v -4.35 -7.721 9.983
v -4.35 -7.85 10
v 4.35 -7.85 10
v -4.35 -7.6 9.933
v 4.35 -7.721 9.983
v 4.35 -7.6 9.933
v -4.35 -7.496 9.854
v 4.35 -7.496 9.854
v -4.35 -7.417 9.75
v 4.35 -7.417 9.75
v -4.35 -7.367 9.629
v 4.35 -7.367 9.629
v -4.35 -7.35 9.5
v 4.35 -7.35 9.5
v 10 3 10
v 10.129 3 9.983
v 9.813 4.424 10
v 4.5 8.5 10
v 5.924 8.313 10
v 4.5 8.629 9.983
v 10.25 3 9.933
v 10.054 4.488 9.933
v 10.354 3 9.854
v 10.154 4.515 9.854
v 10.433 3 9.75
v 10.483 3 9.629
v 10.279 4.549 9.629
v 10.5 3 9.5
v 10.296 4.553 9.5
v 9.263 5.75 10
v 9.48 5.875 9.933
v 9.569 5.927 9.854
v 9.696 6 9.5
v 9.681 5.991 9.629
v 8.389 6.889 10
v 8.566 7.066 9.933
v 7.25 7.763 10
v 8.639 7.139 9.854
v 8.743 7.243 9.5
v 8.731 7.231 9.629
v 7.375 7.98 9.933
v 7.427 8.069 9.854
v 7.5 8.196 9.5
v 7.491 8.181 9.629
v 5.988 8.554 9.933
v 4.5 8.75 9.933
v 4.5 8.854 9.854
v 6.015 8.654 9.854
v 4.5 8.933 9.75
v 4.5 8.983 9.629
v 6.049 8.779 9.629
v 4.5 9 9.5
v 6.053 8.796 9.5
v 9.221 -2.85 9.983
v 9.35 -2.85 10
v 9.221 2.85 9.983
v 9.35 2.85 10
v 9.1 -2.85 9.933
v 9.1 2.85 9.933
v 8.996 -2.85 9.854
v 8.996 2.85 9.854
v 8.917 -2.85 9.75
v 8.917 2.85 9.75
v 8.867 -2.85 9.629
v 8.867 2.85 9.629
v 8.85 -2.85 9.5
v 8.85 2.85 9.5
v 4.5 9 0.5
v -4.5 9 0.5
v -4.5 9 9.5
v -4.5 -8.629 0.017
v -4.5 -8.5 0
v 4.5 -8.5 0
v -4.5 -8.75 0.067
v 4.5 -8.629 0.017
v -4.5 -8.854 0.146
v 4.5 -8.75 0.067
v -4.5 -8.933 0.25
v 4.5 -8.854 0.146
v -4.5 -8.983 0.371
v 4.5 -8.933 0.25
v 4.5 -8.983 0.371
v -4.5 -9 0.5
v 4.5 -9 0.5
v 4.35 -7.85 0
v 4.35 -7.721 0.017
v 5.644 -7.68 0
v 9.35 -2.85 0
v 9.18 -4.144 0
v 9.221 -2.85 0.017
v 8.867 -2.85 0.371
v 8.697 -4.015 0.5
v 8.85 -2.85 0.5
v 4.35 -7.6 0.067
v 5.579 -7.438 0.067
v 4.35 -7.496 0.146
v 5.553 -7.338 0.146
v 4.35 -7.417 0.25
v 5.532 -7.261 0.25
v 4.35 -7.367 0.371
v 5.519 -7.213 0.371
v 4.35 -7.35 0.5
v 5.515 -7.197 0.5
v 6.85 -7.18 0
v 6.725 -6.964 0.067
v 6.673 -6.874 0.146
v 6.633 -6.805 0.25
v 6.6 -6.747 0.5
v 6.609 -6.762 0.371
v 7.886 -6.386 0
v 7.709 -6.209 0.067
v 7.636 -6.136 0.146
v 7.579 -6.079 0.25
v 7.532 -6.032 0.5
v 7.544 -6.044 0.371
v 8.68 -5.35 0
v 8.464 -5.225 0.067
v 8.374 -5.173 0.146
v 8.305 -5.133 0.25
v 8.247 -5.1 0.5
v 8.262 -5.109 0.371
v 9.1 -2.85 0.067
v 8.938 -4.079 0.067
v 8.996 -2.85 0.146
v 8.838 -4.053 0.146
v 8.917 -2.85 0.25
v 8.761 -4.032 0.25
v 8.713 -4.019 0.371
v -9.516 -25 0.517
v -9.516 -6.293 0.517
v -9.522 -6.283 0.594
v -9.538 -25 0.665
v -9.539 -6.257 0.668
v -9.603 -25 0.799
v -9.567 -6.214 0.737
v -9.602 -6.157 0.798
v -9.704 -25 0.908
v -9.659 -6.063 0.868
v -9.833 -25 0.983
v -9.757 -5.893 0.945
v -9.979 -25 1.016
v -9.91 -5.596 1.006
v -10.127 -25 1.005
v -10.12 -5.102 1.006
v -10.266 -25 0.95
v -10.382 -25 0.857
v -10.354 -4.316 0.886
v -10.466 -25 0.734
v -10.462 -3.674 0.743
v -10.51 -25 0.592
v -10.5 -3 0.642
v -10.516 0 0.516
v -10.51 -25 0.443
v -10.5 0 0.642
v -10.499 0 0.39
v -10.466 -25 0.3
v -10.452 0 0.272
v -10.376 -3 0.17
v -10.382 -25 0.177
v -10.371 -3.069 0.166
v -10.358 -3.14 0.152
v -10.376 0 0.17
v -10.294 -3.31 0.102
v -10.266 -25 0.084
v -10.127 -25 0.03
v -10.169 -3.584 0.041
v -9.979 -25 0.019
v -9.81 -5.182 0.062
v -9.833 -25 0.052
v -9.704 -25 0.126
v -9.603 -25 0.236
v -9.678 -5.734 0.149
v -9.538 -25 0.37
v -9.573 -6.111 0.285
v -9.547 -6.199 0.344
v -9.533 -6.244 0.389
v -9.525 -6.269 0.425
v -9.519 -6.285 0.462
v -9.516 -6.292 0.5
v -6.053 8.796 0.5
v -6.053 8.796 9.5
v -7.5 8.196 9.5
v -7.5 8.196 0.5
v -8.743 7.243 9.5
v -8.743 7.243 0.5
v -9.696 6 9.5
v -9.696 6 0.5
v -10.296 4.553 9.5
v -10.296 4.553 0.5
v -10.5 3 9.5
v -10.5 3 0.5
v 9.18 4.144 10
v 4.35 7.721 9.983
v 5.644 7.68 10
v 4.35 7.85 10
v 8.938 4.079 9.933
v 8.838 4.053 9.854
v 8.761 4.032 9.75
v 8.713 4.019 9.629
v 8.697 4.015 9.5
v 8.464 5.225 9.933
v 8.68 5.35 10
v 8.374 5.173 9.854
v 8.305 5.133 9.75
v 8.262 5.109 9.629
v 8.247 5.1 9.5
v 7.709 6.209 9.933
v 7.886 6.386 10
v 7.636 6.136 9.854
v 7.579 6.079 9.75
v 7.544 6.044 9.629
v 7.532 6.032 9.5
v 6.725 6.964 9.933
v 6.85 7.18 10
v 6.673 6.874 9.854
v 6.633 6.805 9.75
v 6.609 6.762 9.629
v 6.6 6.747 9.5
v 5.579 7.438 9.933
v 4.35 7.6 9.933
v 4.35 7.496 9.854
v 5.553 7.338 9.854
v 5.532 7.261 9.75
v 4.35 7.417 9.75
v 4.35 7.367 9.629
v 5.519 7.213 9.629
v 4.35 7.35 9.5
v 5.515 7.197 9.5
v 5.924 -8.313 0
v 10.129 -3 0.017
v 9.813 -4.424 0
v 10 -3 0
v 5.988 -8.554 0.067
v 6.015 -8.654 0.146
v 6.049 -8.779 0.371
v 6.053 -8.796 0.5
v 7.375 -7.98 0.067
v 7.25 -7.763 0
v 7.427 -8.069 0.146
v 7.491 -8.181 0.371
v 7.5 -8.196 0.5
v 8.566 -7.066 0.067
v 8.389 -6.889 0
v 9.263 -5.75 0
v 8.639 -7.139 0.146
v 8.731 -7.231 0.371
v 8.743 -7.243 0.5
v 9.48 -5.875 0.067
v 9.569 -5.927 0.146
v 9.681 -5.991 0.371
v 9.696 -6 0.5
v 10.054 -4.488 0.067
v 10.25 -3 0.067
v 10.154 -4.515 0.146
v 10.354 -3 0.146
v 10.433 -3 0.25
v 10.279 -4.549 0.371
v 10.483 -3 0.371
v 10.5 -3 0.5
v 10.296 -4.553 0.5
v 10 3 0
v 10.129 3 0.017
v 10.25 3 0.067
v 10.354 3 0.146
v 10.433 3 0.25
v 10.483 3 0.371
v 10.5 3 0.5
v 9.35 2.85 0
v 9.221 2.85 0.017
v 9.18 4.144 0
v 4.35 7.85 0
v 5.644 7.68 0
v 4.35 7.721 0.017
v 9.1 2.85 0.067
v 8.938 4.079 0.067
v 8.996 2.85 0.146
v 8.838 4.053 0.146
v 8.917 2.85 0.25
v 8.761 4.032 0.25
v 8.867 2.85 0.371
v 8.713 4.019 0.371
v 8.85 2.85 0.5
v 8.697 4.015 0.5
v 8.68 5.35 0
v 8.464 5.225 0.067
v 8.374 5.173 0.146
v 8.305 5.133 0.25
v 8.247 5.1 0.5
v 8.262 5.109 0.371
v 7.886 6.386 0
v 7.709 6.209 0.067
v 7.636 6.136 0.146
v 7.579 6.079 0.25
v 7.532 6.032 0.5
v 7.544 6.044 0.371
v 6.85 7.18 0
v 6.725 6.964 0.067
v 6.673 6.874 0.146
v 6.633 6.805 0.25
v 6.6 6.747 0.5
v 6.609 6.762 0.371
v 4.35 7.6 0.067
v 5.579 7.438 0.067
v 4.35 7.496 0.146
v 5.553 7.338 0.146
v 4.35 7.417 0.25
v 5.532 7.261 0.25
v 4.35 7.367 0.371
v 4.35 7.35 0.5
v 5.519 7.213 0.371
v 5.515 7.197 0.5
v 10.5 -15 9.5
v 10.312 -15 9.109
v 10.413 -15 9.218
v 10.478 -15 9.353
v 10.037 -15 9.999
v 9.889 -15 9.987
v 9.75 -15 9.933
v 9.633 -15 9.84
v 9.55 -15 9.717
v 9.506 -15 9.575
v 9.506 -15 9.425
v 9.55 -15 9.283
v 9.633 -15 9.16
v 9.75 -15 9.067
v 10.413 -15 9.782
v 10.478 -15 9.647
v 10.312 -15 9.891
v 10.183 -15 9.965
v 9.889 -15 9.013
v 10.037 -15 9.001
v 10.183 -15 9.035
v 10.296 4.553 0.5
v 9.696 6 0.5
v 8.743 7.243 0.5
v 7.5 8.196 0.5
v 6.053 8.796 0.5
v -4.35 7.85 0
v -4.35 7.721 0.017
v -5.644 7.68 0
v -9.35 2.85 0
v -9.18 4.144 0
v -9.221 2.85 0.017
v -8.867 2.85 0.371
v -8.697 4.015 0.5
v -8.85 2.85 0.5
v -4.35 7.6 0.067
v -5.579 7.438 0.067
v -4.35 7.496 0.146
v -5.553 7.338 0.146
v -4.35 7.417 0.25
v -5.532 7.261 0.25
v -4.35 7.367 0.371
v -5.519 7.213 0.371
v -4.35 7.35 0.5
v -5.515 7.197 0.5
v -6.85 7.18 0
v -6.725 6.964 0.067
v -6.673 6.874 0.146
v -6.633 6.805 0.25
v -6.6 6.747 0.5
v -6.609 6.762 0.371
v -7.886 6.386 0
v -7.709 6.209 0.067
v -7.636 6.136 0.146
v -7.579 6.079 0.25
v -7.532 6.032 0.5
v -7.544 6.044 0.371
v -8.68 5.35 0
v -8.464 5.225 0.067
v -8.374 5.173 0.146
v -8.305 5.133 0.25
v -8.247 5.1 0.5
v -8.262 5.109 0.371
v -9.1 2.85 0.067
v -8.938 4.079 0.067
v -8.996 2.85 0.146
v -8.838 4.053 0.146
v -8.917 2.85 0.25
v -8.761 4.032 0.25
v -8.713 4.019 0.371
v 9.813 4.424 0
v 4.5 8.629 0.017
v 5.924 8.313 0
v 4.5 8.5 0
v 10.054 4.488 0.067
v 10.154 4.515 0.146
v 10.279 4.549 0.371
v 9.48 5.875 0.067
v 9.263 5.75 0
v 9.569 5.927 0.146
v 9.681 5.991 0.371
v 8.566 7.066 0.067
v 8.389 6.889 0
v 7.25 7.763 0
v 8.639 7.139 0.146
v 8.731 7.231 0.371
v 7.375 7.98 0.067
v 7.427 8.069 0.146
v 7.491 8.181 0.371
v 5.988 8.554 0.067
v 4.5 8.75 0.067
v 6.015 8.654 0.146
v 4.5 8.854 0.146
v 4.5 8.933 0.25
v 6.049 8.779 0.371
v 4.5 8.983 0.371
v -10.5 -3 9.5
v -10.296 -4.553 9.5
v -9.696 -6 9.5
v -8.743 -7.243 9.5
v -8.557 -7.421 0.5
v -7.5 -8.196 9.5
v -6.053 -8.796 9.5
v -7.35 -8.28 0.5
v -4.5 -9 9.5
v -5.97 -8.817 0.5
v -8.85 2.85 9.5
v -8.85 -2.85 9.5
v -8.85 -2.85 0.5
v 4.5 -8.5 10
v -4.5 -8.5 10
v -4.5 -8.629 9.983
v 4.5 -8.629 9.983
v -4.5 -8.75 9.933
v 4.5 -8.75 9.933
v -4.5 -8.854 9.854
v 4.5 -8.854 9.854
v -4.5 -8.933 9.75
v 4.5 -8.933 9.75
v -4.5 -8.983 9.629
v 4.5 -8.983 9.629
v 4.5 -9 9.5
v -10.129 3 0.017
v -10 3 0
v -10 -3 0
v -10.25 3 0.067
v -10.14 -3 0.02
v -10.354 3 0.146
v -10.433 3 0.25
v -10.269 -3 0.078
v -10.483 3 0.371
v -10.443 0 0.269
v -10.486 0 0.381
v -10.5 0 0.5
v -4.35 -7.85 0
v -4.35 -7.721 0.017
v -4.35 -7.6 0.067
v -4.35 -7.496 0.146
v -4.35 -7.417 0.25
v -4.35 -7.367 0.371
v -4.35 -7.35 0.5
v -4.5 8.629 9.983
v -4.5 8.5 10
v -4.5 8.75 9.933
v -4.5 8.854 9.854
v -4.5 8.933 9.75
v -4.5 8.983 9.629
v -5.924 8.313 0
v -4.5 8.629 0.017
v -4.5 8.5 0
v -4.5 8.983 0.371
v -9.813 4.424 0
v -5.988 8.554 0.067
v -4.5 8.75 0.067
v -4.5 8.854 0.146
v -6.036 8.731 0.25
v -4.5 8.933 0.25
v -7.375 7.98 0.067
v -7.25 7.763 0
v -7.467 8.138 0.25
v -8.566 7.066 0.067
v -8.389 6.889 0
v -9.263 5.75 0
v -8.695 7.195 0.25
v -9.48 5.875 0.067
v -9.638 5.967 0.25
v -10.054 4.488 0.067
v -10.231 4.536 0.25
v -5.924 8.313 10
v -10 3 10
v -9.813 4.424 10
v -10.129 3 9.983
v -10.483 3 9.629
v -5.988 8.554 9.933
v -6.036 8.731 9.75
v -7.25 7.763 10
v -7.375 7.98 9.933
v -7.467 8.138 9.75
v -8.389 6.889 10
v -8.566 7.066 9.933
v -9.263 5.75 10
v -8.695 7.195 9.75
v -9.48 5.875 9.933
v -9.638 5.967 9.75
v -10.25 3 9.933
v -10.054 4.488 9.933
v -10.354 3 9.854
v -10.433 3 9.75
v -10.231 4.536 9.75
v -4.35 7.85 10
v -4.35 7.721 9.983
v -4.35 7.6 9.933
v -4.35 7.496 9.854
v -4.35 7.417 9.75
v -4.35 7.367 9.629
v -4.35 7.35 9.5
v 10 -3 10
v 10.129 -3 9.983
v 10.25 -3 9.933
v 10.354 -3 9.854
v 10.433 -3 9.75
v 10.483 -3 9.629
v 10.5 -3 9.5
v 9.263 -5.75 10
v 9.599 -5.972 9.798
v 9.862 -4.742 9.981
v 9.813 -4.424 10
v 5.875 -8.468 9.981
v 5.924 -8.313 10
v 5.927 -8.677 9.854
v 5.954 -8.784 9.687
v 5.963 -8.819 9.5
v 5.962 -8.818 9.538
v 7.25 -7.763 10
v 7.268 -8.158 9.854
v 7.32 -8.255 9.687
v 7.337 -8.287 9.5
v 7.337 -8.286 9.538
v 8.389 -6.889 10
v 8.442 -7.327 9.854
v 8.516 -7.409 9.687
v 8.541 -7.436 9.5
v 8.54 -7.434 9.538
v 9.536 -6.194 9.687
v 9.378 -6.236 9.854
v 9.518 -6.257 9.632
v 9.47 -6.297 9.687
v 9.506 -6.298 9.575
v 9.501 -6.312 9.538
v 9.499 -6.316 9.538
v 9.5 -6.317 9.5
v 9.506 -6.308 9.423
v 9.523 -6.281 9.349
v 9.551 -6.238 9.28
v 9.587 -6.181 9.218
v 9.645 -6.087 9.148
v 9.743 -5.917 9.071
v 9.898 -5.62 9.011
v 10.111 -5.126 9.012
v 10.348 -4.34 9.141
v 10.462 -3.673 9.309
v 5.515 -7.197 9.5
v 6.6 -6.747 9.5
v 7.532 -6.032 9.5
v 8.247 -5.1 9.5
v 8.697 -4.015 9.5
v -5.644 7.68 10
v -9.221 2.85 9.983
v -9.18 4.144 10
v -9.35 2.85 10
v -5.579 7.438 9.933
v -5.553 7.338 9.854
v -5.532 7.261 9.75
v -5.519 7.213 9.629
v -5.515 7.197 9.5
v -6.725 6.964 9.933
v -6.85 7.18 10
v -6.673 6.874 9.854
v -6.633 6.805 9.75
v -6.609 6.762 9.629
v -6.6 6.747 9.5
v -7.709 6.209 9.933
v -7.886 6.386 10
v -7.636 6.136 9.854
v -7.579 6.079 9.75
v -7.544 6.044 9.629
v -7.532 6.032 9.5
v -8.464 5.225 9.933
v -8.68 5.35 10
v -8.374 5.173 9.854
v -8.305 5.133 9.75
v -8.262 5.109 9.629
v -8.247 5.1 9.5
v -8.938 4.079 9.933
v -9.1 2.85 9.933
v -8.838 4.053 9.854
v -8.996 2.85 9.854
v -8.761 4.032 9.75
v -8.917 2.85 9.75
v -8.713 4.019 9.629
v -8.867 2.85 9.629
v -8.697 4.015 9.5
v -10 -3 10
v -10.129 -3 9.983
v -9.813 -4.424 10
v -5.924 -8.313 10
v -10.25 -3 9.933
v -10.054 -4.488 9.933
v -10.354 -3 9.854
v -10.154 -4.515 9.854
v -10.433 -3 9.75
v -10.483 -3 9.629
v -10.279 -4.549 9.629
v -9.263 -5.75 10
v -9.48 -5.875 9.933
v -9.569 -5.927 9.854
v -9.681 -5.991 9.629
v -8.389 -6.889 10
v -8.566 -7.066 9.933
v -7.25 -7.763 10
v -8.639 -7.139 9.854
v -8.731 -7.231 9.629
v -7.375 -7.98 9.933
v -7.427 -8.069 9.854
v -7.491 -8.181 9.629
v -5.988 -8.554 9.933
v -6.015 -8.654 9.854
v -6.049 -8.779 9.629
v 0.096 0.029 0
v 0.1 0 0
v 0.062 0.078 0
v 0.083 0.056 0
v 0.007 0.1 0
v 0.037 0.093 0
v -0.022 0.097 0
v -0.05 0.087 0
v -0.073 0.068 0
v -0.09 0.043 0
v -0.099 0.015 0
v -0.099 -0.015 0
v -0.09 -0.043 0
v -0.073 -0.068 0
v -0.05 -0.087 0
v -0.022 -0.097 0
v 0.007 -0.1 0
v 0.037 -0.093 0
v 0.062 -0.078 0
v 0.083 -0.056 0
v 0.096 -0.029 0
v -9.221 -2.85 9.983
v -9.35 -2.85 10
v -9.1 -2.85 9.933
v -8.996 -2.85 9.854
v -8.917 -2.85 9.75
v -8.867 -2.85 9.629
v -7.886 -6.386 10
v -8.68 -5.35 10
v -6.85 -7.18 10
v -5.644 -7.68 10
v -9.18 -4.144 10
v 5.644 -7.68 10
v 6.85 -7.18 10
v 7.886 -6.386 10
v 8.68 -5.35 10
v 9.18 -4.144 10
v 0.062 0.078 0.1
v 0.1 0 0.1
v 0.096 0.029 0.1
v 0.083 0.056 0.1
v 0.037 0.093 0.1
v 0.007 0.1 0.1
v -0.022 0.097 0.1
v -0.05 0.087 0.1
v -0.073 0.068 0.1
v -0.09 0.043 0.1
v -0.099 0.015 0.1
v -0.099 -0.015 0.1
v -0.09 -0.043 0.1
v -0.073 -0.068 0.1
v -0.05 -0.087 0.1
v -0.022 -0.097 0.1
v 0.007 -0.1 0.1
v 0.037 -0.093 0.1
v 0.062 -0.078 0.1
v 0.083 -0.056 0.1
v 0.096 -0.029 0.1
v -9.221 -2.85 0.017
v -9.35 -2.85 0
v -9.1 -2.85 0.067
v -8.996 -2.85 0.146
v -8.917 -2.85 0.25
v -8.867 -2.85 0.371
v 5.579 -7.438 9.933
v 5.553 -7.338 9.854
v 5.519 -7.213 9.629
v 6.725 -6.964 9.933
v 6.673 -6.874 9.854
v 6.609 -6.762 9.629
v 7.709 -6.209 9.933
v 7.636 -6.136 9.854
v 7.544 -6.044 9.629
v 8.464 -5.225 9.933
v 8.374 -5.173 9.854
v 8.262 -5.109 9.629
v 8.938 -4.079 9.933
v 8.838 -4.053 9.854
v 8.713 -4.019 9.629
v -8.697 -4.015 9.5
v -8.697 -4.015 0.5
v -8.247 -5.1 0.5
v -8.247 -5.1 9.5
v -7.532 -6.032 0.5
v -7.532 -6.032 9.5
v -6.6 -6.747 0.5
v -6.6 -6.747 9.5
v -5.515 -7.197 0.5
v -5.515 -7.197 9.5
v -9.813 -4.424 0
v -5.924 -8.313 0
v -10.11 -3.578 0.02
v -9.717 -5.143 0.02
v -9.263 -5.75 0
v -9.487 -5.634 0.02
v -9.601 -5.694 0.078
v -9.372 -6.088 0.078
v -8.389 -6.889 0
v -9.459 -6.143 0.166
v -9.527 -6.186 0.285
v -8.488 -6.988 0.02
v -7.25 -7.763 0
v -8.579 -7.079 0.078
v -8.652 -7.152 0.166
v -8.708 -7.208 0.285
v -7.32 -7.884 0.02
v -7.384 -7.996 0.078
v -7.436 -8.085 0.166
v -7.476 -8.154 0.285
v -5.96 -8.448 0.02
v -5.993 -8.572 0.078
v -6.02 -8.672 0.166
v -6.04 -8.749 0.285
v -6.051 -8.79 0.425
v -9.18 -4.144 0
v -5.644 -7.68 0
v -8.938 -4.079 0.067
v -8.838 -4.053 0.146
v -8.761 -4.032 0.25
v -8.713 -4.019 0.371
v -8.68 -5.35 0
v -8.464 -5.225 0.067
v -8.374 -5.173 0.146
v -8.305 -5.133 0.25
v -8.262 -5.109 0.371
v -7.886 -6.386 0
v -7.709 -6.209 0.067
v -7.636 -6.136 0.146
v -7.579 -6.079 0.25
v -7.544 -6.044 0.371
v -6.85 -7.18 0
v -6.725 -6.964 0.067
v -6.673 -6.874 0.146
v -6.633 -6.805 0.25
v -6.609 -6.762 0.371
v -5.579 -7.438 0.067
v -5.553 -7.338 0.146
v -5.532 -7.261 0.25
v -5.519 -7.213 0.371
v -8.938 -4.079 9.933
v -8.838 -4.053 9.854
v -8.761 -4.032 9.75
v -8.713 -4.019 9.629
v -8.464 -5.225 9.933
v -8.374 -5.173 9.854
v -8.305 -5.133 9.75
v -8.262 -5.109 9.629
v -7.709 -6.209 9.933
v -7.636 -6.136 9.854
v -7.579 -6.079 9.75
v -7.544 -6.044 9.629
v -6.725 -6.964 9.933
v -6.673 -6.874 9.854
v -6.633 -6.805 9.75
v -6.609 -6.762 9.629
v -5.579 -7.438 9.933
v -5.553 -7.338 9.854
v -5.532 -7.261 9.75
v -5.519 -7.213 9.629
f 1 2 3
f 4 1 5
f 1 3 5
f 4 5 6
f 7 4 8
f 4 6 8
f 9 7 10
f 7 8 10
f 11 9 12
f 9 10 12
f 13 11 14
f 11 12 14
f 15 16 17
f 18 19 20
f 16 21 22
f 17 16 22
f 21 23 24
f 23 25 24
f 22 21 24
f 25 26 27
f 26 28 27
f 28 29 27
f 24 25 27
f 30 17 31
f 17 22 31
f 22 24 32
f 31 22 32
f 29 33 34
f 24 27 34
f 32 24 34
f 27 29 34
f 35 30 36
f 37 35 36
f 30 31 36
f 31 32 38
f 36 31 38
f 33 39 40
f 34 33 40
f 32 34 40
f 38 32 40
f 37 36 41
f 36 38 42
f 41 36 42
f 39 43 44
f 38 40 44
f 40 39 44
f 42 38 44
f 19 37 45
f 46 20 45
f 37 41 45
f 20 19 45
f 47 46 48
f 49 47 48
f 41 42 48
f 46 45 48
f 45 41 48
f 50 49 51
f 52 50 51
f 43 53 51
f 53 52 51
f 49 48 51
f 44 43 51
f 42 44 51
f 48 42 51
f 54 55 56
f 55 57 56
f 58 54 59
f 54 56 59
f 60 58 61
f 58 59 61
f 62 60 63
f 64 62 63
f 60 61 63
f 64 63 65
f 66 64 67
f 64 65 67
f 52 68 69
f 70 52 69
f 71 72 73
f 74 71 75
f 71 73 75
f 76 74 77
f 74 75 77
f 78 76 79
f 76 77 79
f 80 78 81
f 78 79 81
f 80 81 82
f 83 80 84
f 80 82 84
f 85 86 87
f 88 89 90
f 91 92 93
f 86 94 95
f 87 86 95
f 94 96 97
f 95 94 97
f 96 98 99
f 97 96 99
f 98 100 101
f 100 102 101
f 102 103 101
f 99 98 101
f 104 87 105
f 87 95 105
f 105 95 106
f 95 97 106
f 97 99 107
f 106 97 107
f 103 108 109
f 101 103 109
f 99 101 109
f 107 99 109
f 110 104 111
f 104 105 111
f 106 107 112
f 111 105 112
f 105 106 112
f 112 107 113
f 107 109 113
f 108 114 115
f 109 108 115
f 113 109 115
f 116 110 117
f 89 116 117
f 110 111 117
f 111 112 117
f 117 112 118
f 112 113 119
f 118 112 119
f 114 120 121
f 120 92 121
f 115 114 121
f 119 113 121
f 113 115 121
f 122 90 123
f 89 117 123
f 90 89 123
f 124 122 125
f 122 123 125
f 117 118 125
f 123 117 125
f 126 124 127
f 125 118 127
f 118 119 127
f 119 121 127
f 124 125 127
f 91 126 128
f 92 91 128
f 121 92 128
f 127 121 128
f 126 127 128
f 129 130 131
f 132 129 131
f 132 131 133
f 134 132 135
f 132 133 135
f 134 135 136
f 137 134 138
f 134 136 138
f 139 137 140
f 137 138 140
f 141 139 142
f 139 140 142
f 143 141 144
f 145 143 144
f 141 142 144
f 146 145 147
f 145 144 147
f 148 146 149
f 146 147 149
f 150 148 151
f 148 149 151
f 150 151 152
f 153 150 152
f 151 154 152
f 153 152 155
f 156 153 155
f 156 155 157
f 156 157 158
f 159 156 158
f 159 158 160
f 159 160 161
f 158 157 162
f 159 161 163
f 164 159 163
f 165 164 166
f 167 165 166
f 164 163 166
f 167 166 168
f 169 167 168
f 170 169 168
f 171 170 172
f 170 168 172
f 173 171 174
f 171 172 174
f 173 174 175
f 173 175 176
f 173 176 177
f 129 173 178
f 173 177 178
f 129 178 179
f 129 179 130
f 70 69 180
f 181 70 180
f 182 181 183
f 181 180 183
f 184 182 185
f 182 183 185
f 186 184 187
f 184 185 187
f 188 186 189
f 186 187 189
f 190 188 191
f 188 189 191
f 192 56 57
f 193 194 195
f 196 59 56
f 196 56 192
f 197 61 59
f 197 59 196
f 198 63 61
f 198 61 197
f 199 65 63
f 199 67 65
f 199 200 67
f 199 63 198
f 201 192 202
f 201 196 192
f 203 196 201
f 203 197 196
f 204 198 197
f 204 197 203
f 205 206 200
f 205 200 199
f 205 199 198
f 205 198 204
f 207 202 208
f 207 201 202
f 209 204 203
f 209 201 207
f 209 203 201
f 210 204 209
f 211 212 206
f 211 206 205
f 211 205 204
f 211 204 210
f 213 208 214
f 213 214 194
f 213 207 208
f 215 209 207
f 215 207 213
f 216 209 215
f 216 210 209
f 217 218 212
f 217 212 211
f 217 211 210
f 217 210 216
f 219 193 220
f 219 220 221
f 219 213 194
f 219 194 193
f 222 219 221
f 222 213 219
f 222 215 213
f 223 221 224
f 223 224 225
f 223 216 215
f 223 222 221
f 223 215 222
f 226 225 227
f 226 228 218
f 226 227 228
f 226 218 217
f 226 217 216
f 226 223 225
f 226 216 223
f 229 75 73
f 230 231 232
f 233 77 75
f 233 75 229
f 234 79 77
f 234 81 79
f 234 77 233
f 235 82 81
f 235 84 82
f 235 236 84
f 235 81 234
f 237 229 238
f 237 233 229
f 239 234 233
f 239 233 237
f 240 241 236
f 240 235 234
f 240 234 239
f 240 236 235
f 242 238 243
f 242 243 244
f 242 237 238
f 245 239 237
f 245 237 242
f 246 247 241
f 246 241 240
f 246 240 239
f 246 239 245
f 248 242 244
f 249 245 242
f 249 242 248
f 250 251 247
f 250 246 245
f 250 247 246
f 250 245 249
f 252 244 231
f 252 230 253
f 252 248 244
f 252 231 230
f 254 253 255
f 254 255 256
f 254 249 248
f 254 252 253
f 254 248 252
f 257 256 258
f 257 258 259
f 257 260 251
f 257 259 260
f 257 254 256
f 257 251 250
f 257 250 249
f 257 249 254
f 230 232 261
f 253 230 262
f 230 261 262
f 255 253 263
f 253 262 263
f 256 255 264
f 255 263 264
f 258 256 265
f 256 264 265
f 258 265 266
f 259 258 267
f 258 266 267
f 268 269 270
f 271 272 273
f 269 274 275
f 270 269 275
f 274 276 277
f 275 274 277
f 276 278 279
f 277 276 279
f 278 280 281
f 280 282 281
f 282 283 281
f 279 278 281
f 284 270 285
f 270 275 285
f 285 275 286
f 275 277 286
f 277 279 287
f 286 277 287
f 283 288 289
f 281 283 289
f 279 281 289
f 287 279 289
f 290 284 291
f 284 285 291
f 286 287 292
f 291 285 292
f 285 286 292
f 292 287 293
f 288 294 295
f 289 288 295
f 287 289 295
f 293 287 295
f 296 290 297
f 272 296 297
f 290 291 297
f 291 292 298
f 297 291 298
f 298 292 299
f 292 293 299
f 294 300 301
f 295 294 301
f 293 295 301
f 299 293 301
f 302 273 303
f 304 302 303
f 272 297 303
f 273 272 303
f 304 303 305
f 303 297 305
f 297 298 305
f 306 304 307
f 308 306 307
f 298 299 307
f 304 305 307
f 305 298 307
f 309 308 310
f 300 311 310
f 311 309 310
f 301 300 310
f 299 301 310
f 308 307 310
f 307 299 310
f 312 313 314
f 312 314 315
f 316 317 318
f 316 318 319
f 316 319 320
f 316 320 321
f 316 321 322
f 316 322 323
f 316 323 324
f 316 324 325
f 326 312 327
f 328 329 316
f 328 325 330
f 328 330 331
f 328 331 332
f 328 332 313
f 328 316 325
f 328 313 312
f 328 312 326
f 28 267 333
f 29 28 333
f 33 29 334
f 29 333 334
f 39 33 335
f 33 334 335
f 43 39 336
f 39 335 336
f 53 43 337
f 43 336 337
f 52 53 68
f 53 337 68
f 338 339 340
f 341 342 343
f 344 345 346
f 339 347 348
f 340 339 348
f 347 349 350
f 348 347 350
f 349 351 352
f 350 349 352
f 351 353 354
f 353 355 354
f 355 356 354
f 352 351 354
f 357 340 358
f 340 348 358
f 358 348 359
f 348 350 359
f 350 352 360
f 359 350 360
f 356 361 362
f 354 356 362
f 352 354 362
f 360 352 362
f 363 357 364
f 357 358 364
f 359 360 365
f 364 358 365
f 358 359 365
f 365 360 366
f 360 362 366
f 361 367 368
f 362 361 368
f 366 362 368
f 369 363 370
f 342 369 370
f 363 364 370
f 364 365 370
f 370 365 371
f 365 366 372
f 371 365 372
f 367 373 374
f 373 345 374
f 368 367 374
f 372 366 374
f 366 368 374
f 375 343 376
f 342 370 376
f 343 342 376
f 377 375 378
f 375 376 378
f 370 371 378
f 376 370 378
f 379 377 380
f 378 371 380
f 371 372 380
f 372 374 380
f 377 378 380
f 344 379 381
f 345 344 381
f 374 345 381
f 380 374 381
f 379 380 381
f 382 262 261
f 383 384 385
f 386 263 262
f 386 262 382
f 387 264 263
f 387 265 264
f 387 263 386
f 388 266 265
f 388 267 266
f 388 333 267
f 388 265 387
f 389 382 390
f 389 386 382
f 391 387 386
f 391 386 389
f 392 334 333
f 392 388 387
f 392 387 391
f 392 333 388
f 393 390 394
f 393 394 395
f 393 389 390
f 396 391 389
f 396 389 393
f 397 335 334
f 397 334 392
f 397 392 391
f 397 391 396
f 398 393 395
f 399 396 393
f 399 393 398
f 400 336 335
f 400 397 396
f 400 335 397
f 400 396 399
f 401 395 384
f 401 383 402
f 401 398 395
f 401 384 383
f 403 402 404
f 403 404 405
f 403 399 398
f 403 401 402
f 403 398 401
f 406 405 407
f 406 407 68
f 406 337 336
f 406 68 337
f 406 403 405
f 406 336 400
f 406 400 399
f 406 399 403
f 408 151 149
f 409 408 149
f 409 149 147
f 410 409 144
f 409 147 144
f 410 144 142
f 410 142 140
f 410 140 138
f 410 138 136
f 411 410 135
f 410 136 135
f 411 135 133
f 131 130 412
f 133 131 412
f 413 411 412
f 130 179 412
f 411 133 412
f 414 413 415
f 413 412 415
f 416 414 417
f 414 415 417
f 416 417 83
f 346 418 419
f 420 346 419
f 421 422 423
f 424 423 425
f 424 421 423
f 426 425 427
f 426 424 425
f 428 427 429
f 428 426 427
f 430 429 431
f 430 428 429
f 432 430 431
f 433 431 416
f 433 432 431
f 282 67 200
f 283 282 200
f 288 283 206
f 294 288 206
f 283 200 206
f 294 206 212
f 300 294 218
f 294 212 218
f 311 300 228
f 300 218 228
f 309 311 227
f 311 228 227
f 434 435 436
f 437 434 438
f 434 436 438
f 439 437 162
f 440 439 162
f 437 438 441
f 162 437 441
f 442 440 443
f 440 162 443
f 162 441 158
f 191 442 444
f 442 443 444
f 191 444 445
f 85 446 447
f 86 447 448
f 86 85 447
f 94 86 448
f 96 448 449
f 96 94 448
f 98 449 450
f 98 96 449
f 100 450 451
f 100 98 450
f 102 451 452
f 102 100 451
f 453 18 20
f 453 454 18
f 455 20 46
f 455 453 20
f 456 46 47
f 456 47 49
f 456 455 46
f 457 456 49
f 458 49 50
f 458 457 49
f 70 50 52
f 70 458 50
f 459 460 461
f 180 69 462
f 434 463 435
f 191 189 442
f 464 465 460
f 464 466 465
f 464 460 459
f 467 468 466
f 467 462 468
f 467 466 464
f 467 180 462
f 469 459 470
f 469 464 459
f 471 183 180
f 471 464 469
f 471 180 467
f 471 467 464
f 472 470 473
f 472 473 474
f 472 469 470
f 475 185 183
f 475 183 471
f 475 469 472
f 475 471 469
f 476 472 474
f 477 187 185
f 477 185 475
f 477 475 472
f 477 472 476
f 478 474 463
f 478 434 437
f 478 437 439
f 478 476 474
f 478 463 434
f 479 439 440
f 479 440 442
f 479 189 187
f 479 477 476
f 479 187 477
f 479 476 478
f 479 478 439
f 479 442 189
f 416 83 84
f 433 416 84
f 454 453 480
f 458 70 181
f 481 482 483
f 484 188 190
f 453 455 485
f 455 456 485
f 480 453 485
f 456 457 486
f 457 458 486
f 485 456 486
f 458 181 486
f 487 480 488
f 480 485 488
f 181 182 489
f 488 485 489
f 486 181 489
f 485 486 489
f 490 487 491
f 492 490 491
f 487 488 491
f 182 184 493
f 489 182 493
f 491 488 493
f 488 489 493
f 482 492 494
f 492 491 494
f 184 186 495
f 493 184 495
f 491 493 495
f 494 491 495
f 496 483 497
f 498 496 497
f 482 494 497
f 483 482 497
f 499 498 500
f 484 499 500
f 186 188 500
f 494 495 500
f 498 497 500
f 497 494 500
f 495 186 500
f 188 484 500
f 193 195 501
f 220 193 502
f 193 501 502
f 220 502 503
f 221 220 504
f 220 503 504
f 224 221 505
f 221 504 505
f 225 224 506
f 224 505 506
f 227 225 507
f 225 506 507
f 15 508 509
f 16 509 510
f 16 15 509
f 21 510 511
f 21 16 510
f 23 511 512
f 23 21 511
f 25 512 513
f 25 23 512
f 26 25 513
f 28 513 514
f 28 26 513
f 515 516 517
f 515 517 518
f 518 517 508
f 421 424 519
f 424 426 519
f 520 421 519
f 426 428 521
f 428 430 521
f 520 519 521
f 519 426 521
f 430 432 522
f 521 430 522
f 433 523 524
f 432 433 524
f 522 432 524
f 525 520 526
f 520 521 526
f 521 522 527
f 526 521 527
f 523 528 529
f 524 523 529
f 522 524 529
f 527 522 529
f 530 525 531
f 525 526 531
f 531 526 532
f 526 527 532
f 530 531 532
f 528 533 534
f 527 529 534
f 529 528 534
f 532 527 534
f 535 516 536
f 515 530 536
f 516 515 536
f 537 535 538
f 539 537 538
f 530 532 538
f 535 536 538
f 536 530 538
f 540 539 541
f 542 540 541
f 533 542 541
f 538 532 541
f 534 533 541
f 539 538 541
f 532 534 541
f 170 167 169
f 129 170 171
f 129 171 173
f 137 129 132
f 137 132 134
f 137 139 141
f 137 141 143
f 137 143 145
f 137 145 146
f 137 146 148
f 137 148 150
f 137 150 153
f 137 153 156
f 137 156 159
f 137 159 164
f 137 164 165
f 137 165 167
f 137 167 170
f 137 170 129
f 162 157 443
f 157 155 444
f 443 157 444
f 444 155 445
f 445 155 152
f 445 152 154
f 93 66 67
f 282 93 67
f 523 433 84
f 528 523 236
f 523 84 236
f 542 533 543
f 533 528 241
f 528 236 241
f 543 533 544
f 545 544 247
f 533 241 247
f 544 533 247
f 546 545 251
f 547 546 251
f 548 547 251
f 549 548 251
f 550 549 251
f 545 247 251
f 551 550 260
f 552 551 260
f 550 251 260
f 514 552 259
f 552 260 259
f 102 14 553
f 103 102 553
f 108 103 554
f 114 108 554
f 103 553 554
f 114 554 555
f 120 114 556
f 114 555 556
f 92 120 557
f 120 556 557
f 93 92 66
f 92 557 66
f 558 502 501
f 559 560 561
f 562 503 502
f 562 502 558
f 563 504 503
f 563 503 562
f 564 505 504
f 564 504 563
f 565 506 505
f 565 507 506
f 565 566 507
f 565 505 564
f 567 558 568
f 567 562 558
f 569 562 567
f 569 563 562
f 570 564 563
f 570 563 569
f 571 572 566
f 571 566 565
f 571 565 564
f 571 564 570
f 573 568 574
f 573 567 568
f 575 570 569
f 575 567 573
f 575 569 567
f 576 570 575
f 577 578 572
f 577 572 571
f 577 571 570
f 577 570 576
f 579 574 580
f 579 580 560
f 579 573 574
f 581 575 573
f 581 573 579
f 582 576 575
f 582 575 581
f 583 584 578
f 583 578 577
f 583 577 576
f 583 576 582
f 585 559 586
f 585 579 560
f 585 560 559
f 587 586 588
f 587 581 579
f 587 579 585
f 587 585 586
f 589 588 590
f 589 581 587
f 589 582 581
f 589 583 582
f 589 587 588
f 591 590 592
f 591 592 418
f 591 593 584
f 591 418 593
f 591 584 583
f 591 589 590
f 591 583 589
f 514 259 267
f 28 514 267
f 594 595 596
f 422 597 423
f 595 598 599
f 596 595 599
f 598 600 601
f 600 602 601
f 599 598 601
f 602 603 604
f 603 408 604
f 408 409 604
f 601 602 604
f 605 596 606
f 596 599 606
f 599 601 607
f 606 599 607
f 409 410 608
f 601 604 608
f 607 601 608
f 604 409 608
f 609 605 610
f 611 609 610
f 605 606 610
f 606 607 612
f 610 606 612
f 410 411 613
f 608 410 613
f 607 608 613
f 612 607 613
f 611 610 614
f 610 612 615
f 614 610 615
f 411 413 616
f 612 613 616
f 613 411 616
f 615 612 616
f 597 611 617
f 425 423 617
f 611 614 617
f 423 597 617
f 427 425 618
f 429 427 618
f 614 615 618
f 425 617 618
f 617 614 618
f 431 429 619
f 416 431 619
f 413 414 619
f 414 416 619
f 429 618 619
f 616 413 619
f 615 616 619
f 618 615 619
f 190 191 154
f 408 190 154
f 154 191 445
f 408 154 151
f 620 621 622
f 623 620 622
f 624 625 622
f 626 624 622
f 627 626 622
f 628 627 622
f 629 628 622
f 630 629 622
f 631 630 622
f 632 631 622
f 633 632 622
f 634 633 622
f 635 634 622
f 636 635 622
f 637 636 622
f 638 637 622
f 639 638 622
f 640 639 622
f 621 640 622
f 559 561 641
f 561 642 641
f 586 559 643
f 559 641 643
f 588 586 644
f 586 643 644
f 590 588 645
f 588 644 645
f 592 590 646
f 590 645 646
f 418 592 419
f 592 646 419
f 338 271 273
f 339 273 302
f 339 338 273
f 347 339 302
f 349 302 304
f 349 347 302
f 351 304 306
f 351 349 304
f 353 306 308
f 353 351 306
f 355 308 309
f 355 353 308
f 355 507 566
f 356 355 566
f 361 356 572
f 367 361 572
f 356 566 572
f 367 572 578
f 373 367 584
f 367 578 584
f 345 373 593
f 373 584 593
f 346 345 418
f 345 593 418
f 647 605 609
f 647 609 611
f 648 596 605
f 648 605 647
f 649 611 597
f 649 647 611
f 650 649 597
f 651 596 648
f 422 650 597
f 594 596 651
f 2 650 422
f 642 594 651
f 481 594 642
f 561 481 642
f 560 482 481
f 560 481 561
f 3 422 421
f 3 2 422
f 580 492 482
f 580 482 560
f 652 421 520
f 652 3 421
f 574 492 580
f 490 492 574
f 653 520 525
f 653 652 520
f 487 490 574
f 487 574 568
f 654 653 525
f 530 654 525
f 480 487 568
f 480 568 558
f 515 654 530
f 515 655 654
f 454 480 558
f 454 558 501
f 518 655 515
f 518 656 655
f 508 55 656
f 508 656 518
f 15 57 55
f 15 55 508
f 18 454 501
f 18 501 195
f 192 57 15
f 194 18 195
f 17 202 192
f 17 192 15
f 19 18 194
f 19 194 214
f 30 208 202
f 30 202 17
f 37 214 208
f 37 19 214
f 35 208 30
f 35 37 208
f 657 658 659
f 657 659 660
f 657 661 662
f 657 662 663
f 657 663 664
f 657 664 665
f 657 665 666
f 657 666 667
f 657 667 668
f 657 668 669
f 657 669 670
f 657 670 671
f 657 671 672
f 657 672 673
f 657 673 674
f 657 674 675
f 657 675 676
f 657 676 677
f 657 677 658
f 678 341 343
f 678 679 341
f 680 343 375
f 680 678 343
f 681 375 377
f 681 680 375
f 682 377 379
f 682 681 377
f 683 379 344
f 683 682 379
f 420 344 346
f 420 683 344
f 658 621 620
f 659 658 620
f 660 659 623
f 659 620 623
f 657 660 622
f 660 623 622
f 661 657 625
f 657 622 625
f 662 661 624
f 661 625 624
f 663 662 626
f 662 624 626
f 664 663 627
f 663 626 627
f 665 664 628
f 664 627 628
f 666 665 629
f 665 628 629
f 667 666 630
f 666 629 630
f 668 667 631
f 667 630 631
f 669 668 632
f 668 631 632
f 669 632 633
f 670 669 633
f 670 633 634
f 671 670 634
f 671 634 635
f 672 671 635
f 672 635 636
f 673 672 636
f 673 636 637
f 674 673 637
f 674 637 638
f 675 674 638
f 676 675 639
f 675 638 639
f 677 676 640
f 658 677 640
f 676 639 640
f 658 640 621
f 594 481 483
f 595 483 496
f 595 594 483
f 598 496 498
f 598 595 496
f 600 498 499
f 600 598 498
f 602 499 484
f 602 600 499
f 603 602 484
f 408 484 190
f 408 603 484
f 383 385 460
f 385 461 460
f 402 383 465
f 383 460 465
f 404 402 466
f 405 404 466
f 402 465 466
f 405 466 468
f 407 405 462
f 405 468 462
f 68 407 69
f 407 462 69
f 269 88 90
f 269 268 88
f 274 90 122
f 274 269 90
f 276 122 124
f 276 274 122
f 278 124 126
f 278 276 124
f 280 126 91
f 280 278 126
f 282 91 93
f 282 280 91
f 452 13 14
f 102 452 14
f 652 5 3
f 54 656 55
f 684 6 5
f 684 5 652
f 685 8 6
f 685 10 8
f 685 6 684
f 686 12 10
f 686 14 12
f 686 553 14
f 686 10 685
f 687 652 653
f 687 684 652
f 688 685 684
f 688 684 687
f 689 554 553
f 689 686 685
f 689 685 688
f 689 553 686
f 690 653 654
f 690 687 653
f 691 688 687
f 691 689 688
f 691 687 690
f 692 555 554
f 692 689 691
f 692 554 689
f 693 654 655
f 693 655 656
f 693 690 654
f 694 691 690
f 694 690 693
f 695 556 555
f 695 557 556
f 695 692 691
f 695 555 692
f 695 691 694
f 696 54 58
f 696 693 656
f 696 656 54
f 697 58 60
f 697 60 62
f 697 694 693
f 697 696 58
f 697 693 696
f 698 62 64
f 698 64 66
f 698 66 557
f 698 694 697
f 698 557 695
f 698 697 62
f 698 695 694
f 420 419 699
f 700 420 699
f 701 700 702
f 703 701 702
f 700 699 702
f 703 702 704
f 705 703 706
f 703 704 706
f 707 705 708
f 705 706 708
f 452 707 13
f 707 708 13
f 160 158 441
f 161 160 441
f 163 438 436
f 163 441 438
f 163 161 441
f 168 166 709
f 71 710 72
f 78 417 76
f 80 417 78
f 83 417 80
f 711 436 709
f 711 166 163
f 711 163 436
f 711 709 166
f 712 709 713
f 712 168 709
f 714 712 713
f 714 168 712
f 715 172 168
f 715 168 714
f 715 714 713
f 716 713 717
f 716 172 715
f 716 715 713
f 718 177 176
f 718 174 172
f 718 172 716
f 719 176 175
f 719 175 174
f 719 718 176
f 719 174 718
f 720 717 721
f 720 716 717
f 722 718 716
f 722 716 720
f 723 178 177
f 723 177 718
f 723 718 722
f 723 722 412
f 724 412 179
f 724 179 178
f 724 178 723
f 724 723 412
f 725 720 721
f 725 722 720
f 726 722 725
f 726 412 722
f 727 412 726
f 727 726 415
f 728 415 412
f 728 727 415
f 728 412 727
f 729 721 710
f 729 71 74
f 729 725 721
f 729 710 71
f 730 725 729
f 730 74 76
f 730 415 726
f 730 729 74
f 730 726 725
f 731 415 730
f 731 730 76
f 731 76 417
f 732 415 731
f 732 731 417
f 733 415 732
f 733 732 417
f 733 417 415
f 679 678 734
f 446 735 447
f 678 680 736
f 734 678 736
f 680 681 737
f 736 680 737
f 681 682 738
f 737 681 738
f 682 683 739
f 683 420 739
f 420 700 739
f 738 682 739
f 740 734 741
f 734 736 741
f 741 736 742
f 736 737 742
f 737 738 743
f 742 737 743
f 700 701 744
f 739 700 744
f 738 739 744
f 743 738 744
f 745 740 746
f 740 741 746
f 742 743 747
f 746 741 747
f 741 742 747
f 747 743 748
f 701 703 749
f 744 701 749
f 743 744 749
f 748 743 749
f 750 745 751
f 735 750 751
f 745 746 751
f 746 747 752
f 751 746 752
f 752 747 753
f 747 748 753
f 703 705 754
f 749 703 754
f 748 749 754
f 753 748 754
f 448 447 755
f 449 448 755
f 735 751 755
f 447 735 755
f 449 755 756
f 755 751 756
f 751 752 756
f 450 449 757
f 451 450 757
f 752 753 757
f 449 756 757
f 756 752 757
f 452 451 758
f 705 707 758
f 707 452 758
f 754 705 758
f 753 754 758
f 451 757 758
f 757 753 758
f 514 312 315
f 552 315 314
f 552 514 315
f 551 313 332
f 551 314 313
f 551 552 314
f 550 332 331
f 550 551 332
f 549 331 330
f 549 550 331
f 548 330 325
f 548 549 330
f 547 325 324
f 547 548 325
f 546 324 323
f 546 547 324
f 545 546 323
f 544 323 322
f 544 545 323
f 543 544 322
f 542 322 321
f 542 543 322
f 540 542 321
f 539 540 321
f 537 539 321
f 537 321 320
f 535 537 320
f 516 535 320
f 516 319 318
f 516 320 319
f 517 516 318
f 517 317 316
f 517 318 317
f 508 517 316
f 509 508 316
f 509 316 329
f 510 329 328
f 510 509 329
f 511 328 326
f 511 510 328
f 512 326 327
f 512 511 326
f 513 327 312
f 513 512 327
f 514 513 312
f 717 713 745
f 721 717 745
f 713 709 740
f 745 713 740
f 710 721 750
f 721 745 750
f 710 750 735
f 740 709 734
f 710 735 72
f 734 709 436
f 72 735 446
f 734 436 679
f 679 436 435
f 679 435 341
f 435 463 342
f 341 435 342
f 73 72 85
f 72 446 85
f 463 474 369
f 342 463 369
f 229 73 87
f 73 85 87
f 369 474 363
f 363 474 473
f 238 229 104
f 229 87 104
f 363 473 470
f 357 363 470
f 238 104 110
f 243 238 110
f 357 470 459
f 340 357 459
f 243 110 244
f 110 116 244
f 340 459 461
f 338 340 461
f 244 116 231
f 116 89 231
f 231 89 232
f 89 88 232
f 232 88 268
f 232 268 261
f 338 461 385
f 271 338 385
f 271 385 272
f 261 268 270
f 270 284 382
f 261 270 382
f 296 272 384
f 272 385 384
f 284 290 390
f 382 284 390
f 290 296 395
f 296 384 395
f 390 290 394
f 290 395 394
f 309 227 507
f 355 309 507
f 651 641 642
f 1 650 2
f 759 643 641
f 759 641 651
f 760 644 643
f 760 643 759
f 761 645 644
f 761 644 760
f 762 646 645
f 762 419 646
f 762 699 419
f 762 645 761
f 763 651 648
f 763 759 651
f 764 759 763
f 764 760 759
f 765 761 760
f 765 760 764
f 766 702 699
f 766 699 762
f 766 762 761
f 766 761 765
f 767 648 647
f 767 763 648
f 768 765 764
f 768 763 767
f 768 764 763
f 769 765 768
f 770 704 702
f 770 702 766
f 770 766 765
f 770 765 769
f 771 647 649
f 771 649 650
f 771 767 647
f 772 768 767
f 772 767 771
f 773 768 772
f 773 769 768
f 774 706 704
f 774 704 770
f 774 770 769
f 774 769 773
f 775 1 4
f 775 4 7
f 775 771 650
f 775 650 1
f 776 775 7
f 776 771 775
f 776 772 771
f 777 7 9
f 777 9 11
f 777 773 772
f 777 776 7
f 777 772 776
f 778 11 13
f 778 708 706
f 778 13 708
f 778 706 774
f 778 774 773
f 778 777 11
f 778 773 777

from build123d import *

# Parameters (mm, degrees)
F1_DEPTH  = 10
F3_DEPTH  = 10
F4_R      = 0.5
F5_R      = 0.1
F6_DEPTH  = 0.1
F7_R      = 0.5
F8_DEPTH  = 25
F9_R      = 0.5
F10_DEPTH = 15


# Not quite as in the source:
# - after a boolean that leaves OpenCascade's solid faulty, fix() repairs it


with BuildPart() as f1:
    # F0 (on Top) → F1 (new body)
    with BuildSketch(Plane.XY):
        with BuildLine():
            Line((-4.5, -9), (4.5, -9))
            ThreePointArc((4.5, -9), (8.7426406871, -7.2426406871), (10.5, -3))
            Line((10.5, -3), (10.5, 3))
            ThreePointArc((10.5, 3), (8.7426406871, 7.2426406871), (4.5, 9))
            Line((4.5, 9), (-4.5, 9))
            ThreePointArc((-4.5, 9), (-8.7426406871, 7.2426406871), (-10.5, 3))
            Line((-10.5, 3), (-10.5, -3))
            ThreePointArc((-10.5, -3), (-8.7426406871, -7.2426406871), (-4.5, -9))
        make_face()
    extrude(amount=F1_DEPTH)

    # F2 (on face) → F3 (cut)
    with BuildSketch(Plane.XY.offset(10)):
        with BuildLine():
            Line((-4.35, -7.35), (4.35, -7.35))
            ThreePointArc((4.35, -7.35), (7.5319805153, -6.0319805153), (8.85, -2.85))
            Line((8.85, -2.85), (8.85, 2.85))
            ThreePointArc((8.85, 2.85), (7.5319805153, 6.0319805153), (4.35, 7.35))
            Line((4.35, 7.35), (-4.35, 7.35))
            ThreePointArc((-4.35, 7.35), (-7.5319805153, 6.0319805153), (-8.85, 2.85))
            Line((-8.85, 2.85), (-8.85, -2.85))
            ThreePointArc((-8.85, -2.85), (-7.5319805153, -6.0319805153), (-4.35, -7.35))
        make_face()
    extrude(amount=-F3_DEPTH, mode=Mode.SUBTRACT)

    # F4
    f4_edges = [f1.edges().sort_by_distance(p)[0] for p in [
        (-8.742641, 7.242641, 10),
        (8.85, 0, 10),
        (-8.742641, 7.242641, 0),
        (7.531981, 6.031981, 0),
    ]]
    fillet(f4_edges, radius=F4_R)

    # F7 (on Front) → F8 (join)
    with BuildSketch(Plane.XZ):
        with Locations((-10.0158974528, 0.5172858946)):
            Circle(F7_R)
    extrude(amount=F8_DEPTH)

    # F9 (on Front) → F10 (join)
    with BuildSketch(Plane.XZ):
        with Locations((10, 9.5)):
            Circle(F9_R)
    extrude(amount=F10_DEPTH)

    add(f1.part.fix(), mode=Mode.REPLACE)


with BuildPart() as f6:
    # F5 (on Top) → F6 (new body)
    with BuildSketch(Plane.XY):
        Circle(F5_R)
    extrude(amount=F6_DEPTH)


solid = Compound([f1.part, f6.part])
